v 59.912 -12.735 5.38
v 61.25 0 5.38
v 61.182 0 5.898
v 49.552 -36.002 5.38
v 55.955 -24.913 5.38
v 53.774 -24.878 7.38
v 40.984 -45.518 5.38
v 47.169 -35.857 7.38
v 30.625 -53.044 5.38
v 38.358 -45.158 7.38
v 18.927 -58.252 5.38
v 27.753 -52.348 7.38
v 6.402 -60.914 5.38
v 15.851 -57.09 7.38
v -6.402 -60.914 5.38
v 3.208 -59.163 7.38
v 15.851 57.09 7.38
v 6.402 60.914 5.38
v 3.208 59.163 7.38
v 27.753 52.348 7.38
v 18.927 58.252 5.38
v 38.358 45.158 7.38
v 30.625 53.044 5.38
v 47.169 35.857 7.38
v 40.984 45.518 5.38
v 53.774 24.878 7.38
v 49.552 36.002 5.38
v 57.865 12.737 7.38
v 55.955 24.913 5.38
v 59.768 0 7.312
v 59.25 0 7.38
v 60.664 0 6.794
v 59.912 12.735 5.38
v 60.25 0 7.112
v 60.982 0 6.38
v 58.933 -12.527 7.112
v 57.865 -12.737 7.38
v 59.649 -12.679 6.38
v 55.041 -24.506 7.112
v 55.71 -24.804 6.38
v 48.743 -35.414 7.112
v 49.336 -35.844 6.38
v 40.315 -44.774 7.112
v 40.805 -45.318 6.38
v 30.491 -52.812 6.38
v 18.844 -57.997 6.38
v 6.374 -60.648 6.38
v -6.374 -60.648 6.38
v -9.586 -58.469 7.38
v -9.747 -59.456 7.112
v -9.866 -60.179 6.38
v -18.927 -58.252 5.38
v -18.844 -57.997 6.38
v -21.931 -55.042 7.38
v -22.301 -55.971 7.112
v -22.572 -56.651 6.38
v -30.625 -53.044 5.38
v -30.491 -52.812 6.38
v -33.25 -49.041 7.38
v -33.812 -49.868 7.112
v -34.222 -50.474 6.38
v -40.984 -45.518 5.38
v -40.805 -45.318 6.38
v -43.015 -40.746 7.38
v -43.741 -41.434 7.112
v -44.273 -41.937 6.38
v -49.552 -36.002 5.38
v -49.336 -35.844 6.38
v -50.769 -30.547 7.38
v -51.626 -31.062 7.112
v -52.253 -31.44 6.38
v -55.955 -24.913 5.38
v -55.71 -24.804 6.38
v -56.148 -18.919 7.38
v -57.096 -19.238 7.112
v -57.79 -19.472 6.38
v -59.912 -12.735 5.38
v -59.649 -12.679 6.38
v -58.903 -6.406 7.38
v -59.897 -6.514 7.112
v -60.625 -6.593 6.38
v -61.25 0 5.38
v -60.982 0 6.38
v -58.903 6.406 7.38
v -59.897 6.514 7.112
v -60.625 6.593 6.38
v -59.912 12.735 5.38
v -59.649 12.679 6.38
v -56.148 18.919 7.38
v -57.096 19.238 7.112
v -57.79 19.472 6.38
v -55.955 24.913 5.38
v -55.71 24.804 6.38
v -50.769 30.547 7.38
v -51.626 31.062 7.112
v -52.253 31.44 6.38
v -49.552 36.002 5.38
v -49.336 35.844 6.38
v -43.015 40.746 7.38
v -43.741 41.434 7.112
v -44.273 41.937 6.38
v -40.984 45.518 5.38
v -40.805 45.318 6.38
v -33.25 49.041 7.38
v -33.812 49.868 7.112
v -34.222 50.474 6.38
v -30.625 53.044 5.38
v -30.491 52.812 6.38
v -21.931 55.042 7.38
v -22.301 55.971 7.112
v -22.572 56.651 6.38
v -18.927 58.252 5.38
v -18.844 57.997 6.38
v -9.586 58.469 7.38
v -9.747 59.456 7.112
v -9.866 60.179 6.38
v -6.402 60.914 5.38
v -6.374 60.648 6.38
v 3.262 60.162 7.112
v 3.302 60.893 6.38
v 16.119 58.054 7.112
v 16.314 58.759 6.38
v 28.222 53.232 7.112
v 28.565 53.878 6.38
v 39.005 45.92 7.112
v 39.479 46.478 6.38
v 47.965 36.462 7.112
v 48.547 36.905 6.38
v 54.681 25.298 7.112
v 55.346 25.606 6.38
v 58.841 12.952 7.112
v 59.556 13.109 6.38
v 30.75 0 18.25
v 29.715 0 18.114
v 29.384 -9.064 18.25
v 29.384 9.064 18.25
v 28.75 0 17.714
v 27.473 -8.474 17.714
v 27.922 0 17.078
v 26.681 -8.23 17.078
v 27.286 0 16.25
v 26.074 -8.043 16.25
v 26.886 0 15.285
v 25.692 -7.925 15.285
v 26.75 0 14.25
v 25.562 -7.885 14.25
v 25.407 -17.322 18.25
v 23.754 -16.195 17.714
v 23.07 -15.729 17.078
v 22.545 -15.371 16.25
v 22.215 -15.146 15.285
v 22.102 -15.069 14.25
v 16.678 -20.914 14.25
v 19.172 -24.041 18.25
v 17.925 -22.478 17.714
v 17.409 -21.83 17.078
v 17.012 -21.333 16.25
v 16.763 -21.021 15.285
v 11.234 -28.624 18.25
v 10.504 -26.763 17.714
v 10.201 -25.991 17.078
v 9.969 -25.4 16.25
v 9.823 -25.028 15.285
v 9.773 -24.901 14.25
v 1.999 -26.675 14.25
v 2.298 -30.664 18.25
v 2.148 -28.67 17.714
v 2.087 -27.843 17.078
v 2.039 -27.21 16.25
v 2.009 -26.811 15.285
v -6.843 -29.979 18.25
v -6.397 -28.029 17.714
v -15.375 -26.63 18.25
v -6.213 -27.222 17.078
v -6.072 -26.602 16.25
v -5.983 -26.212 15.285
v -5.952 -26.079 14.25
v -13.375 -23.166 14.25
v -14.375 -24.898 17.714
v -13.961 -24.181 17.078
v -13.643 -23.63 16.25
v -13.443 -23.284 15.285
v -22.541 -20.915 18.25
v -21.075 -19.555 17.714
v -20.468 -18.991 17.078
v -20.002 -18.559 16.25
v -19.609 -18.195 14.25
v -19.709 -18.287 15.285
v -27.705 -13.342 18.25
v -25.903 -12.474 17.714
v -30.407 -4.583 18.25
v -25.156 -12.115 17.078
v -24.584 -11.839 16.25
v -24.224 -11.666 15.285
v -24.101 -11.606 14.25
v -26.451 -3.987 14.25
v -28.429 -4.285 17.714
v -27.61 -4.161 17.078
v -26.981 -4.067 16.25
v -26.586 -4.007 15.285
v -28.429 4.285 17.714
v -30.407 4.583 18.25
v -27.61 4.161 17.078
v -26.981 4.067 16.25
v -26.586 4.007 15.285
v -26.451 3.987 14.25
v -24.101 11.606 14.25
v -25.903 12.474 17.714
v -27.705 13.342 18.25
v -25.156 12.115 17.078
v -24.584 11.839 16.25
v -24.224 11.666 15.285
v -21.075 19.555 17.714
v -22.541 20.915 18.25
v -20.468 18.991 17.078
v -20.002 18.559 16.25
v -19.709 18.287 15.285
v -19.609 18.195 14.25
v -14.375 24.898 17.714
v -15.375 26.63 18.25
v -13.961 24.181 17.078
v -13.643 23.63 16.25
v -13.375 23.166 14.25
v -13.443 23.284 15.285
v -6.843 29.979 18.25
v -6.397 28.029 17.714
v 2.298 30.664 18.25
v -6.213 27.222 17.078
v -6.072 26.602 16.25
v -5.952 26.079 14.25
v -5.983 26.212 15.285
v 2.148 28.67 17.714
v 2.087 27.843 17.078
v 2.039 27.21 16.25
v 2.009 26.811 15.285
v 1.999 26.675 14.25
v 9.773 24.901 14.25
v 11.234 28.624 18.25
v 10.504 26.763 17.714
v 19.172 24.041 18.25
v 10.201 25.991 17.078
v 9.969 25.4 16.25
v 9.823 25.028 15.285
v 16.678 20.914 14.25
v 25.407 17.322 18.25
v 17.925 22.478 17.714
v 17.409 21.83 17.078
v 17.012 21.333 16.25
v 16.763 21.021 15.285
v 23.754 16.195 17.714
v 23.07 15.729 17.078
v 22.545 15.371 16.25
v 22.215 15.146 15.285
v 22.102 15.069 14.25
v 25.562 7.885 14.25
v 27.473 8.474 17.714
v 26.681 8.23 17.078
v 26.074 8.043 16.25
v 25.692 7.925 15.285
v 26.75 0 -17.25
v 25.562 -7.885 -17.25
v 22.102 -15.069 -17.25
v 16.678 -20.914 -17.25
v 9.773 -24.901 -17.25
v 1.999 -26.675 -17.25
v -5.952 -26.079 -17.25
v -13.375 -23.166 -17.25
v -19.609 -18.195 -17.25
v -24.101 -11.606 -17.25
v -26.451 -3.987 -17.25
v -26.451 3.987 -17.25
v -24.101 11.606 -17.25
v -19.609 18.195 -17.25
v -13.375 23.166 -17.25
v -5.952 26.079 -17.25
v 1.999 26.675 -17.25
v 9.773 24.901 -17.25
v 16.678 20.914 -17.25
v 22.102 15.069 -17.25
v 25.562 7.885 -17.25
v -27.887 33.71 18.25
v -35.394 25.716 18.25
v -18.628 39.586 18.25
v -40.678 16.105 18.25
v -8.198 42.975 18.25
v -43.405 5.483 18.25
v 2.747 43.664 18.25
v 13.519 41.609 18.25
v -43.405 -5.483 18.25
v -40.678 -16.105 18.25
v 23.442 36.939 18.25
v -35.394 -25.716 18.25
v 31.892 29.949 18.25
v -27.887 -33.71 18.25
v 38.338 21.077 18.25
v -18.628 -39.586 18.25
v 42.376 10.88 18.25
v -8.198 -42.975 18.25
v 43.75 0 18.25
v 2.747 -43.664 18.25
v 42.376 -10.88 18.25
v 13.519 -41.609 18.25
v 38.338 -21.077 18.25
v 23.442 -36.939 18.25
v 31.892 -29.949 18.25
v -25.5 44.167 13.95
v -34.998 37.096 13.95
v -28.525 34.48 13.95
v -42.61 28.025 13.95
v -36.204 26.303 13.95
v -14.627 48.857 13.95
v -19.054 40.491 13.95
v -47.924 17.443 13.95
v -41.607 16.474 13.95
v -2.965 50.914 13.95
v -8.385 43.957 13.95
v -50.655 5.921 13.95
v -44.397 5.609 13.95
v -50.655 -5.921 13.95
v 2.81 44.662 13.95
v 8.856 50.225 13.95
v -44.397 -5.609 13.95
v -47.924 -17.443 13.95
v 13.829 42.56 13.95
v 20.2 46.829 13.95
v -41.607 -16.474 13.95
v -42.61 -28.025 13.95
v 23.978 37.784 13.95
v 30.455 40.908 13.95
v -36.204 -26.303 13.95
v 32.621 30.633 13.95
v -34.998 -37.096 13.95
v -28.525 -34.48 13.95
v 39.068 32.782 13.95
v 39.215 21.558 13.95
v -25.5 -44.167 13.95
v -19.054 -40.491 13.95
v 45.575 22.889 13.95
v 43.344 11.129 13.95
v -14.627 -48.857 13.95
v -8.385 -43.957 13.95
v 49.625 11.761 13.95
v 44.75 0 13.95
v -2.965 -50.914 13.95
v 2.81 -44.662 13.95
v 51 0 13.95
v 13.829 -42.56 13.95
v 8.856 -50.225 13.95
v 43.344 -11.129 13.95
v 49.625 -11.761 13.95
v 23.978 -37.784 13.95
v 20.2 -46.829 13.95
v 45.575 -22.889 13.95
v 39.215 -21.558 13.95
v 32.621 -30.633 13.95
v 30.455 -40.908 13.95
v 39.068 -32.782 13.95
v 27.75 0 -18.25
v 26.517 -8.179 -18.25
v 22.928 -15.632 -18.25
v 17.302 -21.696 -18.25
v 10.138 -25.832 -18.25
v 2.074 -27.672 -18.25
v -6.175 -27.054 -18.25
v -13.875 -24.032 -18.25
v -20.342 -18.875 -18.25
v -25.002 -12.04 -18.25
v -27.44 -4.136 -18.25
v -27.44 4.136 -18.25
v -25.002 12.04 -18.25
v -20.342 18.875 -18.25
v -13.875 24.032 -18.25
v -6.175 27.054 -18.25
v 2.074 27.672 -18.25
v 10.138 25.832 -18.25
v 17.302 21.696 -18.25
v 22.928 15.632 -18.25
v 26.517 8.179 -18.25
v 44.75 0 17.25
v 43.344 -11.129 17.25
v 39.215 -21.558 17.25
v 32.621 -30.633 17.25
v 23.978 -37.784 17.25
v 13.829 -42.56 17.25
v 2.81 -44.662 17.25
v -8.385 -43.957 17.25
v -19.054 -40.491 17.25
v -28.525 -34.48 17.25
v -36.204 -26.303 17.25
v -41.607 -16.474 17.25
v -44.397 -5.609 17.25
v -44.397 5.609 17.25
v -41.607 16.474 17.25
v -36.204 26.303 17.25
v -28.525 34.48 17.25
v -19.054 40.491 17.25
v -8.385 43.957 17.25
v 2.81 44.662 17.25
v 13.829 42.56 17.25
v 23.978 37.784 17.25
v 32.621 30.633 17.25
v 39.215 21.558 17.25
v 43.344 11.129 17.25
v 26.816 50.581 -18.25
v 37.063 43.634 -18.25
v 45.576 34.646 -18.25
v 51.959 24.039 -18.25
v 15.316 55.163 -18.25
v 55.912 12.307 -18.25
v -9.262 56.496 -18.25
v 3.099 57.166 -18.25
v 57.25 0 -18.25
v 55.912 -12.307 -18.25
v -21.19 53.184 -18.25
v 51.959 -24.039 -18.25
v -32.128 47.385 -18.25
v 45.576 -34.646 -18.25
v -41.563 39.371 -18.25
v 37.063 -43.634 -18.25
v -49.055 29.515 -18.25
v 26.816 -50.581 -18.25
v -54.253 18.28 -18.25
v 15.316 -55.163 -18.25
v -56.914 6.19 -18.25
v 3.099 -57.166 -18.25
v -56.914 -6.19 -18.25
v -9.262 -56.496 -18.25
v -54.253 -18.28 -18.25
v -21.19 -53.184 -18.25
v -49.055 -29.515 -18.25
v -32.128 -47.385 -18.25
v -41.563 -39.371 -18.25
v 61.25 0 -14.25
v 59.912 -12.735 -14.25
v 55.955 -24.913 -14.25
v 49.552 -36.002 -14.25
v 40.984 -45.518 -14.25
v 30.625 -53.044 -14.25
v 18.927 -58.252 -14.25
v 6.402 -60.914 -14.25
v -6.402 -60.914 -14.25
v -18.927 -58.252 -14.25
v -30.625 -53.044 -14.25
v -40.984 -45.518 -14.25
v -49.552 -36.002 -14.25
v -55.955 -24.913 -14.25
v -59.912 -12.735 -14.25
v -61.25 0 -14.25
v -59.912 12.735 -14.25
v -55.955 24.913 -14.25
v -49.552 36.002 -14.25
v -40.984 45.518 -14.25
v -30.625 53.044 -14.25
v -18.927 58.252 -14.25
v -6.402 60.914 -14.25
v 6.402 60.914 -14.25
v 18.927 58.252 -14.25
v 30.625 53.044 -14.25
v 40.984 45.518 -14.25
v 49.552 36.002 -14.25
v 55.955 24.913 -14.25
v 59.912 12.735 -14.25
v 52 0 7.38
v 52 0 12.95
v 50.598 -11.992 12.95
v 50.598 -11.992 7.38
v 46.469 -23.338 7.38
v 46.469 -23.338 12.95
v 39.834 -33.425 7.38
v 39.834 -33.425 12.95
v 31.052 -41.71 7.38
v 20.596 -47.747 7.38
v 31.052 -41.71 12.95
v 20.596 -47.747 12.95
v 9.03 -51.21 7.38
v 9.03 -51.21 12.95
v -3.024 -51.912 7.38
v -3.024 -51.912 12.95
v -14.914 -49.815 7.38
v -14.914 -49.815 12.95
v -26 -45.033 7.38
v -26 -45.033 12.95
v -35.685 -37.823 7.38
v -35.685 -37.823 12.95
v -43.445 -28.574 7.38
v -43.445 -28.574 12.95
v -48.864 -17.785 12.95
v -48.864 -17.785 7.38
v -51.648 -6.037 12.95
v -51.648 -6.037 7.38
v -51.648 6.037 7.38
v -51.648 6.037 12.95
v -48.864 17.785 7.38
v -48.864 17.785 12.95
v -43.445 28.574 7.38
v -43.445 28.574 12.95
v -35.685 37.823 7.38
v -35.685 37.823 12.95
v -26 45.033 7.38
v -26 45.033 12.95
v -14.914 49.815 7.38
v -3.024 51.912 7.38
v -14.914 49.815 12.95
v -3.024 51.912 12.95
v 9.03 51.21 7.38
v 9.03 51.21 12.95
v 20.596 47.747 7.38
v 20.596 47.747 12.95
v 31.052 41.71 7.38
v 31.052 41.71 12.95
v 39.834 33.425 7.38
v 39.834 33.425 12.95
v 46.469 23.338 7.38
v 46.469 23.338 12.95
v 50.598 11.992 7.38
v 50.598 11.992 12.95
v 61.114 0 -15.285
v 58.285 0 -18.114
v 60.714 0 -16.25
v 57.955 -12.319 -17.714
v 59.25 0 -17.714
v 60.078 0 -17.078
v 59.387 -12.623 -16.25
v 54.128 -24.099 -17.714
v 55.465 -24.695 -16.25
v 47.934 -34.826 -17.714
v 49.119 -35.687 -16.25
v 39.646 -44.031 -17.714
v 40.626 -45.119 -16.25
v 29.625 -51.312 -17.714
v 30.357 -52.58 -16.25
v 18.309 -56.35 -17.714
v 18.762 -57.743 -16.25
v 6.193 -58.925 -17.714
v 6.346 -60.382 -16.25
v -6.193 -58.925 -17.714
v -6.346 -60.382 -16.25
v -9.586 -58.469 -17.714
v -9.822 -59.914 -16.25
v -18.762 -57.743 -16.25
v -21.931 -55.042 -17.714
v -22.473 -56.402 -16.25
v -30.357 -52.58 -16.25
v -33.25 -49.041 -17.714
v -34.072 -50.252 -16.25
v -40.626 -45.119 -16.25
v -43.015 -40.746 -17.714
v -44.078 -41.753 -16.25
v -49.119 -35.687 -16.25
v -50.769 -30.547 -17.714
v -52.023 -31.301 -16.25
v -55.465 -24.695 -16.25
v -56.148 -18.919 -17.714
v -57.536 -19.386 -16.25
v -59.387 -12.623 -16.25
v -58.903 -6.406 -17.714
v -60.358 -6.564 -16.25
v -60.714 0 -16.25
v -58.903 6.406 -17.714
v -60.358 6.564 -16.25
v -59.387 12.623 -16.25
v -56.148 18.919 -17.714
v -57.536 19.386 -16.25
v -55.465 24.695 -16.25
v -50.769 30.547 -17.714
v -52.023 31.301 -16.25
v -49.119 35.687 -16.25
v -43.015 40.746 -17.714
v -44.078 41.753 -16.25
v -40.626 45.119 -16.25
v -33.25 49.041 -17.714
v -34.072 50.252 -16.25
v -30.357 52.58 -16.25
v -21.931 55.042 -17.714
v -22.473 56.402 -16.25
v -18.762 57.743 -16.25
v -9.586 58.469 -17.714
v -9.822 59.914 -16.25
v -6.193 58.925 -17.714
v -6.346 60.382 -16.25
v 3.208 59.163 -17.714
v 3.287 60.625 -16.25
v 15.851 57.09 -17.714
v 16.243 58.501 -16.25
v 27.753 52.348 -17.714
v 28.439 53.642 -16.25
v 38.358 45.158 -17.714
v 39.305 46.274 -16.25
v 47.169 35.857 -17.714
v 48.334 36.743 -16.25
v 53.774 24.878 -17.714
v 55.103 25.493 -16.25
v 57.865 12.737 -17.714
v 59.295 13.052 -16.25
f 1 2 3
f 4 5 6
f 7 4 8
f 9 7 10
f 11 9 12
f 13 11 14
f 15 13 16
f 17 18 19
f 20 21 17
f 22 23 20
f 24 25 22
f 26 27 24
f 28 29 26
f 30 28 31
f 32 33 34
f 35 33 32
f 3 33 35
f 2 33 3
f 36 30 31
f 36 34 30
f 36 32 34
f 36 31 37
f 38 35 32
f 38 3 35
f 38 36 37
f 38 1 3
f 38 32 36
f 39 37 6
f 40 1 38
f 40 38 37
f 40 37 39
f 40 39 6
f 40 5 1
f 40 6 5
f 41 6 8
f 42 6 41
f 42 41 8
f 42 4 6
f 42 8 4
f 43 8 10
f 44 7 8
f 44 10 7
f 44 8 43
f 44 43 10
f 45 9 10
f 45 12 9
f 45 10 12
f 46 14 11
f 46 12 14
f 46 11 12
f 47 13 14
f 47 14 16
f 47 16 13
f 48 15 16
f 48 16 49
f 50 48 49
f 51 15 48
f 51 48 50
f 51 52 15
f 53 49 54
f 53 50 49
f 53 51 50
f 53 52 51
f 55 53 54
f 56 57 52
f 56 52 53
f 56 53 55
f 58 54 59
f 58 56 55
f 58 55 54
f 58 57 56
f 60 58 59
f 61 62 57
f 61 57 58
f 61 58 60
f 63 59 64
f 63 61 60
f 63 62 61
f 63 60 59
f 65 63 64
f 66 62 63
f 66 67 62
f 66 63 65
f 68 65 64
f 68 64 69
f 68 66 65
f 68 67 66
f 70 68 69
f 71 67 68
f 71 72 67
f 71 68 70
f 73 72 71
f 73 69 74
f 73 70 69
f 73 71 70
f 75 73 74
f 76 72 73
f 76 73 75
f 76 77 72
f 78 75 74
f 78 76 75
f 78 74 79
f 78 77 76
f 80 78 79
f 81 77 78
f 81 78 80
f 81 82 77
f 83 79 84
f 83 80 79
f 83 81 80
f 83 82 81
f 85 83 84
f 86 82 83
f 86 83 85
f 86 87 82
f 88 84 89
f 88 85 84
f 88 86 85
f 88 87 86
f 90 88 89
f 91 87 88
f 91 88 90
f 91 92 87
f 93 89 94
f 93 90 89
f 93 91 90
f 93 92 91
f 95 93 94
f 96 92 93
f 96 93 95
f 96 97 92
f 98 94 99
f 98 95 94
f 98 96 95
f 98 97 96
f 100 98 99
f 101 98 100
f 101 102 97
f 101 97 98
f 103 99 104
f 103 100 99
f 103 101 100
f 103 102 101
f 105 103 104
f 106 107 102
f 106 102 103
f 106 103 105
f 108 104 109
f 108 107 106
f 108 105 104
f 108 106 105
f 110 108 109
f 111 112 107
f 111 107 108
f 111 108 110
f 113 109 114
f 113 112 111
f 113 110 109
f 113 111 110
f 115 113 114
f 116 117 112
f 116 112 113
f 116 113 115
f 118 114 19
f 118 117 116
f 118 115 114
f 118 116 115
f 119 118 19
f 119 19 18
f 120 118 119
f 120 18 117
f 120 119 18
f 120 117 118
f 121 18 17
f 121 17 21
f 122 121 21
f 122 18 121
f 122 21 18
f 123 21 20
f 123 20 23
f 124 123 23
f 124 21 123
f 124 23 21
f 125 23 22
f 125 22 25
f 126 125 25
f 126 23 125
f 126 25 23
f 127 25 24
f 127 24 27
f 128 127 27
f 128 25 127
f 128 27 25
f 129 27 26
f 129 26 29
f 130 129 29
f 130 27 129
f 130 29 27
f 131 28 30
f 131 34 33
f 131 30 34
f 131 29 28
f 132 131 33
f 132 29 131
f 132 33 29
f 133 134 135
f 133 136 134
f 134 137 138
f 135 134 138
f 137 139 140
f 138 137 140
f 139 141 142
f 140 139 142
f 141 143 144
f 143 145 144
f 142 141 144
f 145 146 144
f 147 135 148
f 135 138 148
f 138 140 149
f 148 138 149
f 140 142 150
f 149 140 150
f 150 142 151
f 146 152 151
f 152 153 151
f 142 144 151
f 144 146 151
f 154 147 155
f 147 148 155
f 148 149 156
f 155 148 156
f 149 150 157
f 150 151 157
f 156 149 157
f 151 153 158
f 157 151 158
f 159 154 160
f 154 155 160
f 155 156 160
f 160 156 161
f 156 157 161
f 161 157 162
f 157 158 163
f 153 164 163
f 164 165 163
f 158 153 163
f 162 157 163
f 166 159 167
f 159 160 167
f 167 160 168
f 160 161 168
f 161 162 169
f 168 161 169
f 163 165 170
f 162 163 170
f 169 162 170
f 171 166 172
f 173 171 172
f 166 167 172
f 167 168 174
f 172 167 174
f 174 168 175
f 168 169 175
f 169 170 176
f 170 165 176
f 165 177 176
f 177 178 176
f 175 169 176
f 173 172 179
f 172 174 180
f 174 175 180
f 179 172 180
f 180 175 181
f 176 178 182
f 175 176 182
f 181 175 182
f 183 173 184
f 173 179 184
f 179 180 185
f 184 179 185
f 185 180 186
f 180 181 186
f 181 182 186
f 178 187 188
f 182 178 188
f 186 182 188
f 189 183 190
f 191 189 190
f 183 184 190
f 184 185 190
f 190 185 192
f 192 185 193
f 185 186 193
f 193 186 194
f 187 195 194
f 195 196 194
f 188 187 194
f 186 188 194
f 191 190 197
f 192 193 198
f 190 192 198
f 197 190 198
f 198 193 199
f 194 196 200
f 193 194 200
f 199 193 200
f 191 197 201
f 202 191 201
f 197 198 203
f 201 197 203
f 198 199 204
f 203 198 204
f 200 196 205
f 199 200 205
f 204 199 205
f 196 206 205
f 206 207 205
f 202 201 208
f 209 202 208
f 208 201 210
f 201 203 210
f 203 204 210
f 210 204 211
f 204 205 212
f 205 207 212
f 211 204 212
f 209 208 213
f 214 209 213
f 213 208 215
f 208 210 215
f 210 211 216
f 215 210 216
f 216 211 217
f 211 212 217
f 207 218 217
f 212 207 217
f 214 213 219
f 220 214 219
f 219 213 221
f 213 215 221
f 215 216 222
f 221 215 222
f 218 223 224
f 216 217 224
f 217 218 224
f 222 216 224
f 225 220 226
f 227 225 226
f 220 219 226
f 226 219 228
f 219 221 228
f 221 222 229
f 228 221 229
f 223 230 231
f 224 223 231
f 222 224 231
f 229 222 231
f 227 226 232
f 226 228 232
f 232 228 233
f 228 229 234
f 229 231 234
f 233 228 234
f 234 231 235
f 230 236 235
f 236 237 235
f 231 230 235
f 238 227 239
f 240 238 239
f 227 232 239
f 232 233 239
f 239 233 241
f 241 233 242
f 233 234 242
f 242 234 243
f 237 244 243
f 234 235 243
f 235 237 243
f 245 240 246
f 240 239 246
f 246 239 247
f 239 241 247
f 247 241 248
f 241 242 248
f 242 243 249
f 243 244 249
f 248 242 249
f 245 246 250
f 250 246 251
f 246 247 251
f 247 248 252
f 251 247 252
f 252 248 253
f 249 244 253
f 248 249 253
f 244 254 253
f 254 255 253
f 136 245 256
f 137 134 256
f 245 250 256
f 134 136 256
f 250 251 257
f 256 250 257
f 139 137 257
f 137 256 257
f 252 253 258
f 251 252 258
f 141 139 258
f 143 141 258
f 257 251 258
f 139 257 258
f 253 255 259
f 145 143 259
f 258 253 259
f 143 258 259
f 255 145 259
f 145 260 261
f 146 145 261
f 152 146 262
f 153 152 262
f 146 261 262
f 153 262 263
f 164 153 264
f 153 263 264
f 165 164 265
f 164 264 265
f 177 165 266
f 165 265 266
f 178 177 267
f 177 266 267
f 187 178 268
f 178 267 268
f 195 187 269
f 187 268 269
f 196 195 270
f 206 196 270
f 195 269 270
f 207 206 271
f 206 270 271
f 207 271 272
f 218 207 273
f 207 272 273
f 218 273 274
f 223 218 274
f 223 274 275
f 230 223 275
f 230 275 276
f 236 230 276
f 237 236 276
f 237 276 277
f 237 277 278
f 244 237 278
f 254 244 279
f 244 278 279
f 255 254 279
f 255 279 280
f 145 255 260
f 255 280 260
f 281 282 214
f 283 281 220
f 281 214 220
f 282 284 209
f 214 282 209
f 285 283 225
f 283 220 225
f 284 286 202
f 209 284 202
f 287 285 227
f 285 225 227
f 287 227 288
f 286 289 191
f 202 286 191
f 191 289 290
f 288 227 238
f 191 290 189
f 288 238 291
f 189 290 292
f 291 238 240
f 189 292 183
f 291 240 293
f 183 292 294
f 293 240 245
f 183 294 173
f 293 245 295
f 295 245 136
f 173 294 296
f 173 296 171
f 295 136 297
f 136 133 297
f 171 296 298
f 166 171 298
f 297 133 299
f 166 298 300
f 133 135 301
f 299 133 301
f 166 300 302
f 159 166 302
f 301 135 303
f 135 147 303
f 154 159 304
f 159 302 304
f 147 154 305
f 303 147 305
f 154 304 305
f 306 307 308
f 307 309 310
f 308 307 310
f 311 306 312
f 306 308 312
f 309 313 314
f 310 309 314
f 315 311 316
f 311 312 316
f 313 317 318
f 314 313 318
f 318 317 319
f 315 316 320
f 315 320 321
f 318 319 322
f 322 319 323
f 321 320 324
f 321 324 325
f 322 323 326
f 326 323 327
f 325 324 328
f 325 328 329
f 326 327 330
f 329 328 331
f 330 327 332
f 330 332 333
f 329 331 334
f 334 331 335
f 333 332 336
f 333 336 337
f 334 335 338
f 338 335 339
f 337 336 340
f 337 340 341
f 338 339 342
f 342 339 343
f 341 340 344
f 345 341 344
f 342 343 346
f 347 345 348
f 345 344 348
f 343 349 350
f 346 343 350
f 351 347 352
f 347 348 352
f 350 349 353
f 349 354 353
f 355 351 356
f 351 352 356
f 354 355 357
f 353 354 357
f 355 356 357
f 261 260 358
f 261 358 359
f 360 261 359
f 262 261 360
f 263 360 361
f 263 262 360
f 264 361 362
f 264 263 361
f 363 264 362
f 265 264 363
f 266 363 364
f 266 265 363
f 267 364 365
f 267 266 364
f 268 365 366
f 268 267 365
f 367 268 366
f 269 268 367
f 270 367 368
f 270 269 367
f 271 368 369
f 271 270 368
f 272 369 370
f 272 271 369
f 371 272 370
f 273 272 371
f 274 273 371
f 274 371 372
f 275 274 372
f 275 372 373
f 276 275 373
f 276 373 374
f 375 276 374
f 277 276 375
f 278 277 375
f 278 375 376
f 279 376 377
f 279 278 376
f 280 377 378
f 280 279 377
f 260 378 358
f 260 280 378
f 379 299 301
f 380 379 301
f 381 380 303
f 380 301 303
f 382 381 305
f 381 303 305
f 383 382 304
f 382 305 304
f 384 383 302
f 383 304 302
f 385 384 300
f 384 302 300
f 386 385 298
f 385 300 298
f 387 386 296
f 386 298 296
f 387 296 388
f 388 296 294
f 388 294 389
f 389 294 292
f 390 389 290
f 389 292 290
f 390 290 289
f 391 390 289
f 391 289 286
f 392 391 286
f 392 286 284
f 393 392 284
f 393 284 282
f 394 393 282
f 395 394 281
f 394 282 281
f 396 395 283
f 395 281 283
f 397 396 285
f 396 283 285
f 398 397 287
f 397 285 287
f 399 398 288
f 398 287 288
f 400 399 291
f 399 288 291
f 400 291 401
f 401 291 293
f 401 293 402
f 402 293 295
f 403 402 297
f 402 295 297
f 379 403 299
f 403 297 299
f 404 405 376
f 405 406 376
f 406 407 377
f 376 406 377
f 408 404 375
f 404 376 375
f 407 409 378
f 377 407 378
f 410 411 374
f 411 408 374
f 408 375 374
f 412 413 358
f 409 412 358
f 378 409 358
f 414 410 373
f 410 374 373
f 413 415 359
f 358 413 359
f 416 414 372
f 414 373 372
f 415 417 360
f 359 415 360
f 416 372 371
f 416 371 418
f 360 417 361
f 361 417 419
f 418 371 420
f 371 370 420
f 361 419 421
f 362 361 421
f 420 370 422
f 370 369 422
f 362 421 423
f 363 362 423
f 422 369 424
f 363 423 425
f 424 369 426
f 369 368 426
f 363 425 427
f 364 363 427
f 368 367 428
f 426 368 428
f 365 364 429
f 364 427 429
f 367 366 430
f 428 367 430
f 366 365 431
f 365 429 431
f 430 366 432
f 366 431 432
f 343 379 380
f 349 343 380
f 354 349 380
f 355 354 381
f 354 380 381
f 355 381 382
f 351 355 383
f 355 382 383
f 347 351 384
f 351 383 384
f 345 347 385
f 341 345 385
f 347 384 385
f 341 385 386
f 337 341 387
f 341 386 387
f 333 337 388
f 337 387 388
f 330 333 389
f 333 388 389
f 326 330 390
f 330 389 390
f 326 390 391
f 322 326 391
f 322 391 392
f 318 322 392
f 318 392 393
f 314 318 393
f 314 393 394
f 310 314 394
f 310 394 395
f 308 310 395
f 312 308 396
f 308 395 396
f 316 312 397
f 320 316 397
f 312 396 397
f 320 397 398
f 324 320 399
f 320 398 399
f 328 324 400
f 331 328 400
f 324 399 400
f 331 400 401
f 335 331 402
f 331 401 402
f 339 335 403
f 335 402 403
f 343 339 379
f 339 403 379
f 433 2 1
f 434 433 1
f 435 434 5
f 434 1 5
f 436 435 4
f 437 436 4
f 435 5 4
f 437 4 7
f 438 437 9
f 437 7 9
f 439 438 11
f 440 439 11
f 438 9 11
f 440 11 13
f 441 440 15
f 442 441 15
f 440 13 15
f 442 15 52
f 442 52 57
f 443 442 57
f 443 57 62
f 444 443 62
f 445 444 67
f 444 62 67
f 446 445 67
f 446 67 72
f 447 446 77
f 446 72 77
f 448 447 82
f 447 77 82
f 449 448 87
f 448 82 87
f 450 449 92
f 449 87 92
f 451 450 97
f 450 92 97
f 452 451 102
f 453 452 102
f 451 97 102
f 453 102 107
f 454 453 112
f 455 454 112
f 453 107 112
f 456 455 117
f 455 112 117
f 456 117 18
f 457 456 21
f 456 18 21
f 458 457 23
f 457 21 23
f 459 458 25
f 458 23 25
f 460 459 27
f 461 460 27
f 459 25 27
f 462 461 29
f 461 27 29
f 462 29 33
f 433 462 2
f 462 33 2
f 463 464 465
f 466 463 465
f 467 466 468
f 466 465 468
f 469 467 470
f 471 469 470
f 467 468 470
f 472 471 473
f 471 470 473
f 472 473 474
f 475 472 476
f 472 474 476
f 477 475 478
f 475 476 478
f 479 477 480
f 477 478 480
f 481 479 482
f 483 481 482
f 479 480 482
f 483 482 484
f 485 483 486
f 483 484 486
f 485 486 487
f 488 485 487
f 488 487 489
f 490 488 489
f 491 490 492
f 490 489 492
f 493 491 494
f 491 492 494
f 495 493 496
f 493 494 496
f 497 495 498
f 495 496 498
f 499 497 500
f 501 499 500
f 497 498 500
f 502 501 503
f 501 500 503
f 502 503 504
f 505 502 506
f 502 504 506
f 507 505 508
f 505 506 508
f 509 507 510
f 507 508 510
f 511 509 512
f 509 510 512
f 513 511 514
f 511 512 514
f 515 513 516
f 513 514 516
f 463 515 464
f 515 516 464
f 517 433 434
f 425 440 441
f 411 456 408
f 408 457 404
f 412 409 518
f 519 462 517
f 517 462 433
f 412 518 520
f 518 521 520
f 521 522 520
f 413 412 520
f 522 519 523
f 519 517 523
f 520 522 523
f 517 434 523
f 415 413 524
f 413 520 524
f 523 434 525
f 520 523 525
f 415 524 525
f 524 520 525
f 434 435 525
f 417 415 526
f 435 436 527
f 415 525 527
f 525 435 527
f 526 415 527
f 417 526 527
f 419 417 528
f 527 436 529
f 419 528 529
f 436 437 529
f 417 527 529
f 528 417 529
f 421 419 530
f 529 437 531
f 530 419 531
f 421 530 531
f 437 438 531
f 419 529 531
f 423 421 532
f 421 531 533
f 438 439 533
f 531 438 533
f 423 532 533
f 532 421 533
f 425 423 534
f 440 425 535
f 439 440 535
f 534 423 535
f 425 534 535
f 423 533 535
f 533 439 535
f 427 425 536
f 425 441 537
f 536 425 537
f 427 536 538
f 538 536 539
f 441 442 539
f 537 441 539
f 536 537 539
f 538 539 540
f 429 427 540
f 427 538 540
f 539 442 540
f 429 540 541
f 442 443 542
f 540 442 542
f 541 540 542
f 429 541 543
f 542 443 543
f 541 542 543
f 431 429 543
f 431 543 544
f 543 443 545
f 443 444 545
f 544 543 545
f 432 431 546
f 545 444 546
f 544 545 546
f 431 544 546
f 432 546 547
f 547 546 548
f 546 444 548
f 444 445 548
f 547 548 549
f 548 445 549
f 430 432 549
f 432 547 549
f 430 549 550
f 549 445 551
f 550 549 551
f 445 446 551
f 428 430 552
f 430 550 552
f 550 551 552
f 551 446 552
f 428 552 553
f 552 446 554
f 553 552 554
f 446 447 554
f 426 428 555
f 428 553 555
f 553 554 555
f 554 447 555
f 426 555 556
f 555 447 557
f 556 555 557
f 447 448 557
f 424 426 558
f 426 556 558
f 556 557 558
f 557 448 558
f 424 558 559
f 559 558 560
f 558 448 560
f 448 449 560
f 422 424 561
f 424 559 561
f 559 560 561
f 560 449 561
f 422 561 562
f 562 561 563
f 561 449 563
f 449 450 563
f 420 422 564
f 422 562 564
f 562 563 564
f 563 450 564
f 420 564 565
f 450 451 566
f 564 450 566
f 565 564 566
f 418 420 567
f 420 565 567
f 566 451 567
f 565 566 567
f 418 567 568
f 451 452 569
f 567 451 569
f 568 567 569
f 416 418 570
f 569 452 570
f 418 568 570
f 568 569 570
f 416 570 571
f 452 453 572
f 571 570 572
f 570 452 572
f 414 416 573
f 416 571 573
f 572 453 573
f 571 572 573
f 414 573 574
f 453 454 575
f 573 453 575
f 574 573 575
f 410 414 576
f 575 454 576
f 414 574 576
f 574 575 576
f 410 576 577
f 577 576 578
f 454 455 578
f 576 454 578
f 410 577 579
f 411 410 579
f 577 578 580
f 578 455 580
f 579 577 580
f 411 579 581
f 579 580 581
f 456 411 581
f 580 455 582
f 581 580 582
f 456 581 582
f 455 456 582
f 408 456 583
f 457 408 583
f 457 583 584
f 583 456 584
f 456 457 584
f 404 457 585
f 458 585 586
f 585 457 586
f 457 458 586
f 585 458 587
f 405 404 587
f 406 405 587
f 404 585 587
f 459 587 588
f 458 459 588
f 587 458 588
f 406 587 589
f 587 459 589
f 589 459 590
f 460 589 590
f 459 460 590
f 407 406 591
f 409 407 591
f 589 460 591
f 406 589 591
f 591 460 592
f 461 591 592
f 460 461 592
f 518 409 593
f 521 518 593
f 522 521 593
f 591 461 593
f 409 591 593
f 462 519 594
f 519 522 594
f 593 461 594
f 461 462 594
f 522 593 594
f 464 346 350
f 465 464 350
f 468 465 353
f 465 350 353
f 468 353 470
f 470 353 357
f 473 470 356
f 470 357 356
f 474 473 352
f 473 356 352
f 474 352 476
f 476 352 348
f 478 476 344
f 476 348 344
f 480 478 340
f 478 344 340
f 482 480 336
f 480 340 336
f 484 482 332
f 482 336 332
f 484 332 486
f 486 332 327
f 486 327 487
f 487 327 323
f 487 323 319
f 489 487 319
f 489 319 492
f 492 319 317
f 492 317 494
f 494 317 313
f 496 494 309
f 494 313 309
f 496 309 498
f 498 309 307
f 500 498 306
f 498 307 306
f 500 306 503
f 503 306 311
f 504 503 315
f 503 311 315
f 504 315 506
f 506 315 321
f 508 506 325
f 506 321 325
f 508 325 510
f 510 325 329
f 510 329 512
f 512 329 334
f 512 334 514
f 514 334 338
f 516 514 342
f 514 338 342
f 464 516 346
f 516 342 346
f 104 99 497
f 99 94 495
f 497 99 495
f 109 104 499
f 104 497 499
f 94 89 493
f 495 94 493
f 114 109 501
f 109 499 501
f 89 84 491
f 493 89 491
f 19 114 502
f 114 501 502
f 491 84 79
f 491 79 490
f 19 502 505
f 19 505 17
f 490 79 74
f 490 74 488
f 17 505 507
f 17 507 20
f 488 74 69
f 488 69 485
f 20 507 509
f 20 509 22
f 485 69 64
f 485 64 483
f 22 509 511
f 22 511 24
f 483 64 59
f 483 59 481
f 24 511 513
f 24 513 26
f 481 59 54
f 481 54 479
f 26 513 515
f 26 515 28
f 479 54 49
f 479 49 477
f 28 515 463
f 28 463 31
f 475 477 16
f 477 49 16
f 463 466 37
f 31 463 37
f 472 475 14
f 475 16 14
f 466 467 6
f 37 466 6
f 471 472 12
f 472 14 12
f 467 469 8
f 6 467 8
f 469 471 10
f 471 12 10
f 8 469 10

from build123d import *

# Parameters (mm, degrees)
F2_R    = 4
F3_R    = 2
F4_SIZE = 1


with BuildPart() as f1:
    # F0 (on Front) → F1 (revolve)
    with BuildSketch(Plane.XZ):
        Polygon((44.75, 18.25), (26.75, 18.25), (26.75, -18.25), (61.25, -18.25), (61.25, 7.38), (52, 7.38), (52, 13.95), (44.75, 13.95), align=None)
    revolve(axis=Axis((0, 0, -12.351525), (0, 0, -1)))

    # F2
    f2_edges = [f1.edges().sort_by_distance(p)[0] for p in [
        (-26.75, 0, 18.25),
        (-61.25, 0, -18.25),
    ]]
    fillet(f2_edges, radius=F2_R)

    # F3
    f3_edges = [f1.edges().sort_by_distance(p)[0] for p in [
        (-61.25, 0, 7.38),
    ]]
    fillet(f3_edges, radius=F3_R)

    # F4
    f4_edges = [f1.edges().sort_by_distance(p)[0] for p in [
        (-44.75, 0, 18.25),
        (-52, 0, 13.95),
        (-26.75, 0, -18.25),
    ]]
    chamfer(f4_edges, length=F4_SIZE)


solid = f1.part
